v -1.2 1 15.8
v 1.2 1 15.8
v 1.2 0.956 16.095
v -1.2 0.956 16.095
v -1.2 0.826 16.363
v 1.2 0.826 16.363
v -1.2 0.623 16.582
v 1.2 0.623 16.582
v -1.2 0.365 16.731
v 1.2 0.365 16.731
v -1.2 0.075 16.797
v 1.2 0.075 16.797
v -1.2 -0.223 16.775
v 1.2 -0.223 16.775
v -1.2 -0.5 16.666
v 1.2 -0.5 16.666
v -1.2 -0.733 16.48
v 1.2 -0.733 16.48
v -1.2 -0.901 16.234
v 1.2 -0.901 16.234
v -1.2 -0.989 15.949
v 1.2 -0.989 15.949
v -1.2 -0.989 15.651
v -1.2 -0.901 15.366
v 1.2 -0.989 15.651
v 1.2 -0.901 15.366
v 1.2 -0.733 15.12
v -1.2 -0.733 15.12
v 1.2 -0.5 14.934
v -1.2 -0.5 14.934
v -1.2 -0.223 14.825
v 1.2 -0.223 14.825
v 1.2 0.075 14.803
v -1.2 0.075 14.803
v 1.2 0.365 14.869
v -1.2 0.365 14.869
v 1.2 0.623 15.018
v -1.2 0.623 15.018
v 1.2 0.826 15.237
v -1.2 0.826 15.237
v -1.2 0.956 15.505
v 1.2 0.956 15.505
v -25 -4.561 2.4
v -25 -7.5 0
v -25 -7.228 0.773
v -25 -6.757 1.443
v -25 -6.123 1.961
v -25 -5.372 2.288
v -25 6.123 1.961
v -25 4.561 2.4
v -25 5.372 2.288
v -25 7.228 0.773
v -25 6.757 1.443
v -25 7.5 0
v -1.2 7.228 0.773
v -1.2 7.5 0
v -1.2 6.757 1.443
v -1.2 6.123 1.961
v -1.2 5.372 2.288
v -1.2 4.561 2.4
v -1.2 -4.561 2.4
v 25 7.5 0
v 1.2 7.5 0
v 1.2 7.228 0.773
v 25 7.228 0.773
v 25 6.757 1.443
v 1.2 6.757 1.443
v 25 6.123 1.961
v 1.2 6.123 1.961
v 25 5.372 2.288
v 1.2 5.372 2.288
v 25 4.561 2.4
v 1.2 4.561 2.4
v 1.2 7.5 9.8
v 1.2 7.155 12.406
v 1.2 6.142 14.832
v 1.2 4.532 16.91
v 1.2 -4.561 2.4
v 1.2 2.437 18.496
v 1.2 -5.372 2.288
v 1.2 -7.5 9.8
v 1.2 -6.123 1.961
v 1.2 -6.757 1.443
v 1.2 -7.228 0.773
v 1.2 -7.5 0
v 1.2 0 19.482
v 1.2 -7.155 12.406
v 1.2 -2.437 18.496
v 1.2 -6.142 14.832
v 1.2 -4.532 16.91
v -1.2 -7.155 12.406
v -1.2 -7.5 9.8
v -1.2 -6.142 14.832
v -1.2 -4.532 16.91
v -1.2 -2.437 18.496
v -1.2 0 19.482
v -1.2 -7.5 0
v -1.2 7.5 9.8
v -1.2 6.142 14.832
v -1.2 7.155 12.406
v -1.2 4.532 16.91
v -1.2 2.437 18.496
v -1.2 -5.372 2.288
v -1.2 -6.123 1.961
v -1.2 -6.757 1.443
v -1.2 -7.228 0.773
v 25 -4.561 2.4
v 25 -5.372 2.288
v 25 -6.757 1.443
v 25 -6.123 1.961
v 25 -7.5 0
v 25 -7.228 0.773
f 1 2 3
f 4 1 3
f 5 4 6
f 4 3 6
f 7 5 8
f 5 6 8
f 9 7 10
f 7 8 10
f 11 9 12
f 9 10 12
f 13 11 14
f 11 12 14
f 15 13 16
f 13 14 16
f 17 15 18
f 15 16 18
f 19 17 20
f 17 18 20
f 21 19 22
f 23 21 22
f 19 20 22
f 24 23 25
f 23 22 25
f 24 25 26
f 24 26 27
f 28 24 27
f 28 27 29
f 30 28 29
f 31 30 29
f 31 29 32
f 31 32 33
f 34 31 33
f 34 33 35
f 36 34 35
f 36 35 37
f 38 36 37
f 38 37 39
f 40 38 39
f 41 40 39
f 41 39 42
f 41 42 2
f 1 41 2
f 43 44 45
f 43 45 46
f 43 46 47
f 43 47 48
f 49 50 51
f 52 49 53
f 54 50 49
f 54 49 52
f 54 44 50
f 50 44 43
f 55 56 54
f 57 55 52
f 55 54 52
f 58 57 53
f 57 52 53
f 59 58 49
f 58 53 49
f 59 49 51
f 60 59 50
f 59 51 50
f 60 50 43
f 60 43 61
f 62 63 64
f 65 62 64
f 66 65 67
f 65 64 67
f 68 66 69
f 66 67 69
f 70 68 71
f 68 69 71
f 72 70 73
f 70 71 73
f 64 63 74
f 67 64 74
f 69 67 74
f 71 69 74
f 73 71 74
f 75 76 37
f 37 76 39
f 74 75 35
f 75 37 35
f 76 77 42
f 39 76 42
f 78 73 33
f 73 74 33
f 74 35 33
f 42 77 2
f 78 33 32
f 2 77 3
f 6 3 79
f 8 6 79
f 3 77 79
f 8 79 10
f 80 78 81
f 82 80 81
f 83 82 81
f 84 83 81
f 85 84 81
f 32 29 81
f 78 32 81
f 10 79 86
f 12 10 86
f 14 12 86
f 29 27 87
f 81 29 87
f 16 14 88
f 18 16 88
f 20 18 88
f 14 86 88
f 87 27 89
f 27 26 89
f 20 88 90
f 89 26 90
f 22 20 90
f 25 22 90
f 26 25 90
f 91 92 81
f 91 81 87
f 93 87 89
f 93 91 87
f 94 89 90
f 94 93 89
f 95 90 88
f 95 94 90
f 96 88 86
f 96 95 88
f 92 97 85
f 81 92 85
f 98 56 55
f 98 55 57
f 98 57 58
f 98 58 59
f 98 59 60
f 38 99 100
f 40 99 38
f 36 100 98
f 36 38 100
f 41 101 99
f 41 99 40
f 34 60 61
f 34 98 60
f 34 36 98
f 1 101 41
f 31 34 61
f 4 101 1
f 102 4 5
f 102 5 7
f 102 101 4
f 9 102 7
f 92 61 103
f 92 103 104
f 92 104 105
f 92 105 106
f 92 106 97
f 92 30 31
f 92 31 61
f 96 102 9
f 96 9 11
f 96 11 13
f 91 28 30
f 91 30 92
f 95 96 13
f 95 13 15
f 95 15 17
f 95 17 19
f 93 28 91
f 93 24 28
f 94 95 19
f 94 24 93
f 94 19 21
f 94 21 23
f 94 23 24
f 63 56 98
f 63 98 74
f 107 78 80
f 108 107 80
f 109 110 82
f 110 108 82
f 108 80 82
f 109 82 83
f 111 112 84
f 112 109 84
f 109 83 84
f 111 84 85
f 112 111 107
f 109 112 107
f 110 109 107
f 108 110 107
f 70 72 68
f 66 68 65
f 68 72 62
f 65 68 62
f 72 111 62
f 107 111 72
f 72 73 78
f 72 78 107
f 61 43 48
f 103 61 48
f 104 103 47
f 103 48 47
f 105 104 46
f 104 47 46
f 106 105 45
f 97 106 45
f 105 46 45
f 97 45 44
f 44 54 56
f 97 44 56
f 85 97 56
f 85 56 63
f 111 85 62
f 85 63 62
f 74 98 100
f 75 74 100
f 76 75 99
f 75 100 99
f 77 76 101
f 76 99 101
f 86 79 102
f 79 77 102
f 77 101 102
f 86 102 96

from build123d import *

# Parameters (mm, degrees)
F0_W         = 50
F0_H         = 15
F2_DEPTH     = 2.4
F3_W         = 2.4
F3_H         = 15
F4_DEPTH     = 17.4
F6_T1_DEPTH  = 52.4
F5_R         = 1
F7_DEPTH     = 26.201
F8_T1_DEPTH  = 31.1484692284
F8_T3_DEPTH  = 31.1484692284
F8_T8_DEPTH  = 38.4969384567
F8_T13_DEPTH = 38.4969384567
F8_T18_DEPTH = 38.4969384567
F8_T23_DEPTH = 38.4969384567


# Not quite as in the source:
# - a fillet or chamfer that OpenCascade refuses, or shapes differently, is made with other operations: its cross-section is extruded or revolved along the edge and cut away or added


with BuildPart() as f2:
    # F0 (on Top) → F2 (new body)
    with BuildSketch(Plane.XY):
        Rectangle(F0_W, F0_H)
    extrude(amount=F2_DEPTH)

    # F3 (on face) → F4 (join)
    with BuildSketch(Plane.XY.offset(2.4)):
        Rectangle(F3_W, F3_H)
    extrude(amount=F4_DEPTH)

    # F6: fillet of radius 10 on 2 edges, made by hand

    # F6_s2 → F6_t1 (cut)
    with BuildSketch(Plane.YZ.offset(-26.2)):
        with BuildLine():
            ThreePointArc((-7.5, 9.8), (-4.5710678119, 16.8710678119), (2.5, 19.8))
            Line((2.5, 19.8), (-7.5, 19.8))
            Line((-7.5, 19.8), (-7.5, 9.8))
        make_face()
        with BuildLine():
            ThreePointArc((7.5, 9.8), (4.5710678119, 16.8710678119), (-2.5, 19.8))
            Line((-2.5, 19.8), (7.5, 19.8))
            Line((7.5, 19.8), (7.5, 9.8))
        make_face()
    extrude(amount=F6_T1_DEPTH, mode=Mode.SUBTRACT)

    # F5 (on face) → F7 (cut, through all)
    with BuildSketch(Plane.YZ.offset(1.2)):
        with Locations((0, 15.8)):
            Circle(F5_R)
    extrude(amount=-F7_DEPTH, mode=Mode.SUBTRACT)

    # F8: fillet of radius 3 on 4 edges, made by hand

    # F8_s2 → F8_t1 (cut)
    with BuildSketch(Plane.YZ.offset(-32.3484692284)):
        with BuildLine():
            ThreePointArc((-4.5606123087, 2.4), (-6.4579789048, 1.7237900077), (-7.5, 0))
            Line((-7.5, 0), (-7.5, 2.4))
            Line((-7.5, 2.4), (-4.5606123087, 2.4))
        make_face()
        with BuildLine():
            ThreePointArc((7.5, 0), (6.4579789048, 1.7237900077), (4.5606123087, 2.4))
            Line((4.5606123087, 2.4), (7.5, 2.4))
            Line((7.5, 2.4), (7.5, 0))
        make_face()
    extrude(amount=F8_T1_DEPTH, mode=Mode.SUBTRACT)

    # F8_s4 → F8_t3 (cut)
    with BuildSketch(Plane.YZ.offset(1.2)):
        with BuildLine():
            ThreePointArc((-4.5606123087, 2.4), (-6.4579789048, 1.7237900077), (-7.5, 0))
            Line((-7.5, 0), (-7.5, 2.4))
            Line((-7.5, 2.4), (-4.5606123087, 2.4))
        make_face()
        with BuildLine():
            ThreePointArc((7.5, 0), (6.4579789048, 1.7237900077), (4.5606123087, 2.4))
            Line((4.5606123087, 2.4), (7.5, 2.4))
            Line((7.5, 2.4), (7.5, 0))
        make_face()
    extrude(amount=F8_T3_DEPTH, mode=Mode.SUBTRACT)


with BuildPart() as f8_tool6:
    # F8_s7 → F8_t8 (new body)
    with BuildSketch(Plane.YZ.offset(-32.3484692284)):
        with BuildLine():
            ThreePointArc((-4.5606123087, 2.4), (-6.4579789048, 1.7237900077), (-7.5, 0))
            Line((-7.5, 0), (-7.5, 2.4))
            Line((-7.5, 2.4), (-4.5606123087, 2.4))
        make_face()
    extrude(amount=F8_T8_DEPTH)

    split(bisect_by=Plane.YZ.offset(1.2), keep=Keep.TOP)


with BuildPart() as f2_1:
    add(f2.part)

    # F8_t5: cut F8_tool6
    add(f8_tool6.part, mode=Mode.SUBTRACT)


with BuildPart() as f8_tool11:
    # F8_s12 → F8_t13 (new body)
    with BuildSketch(Plane.YZ.offset(-6.1484692284)):
        with BuildLine():
            ThreePointArc((-4.5606123087, 2.4), (-6.4579789048, 1.7237900077), (-7.5, 0))
            Line((-7.5, 0), (-7.5, 2.4))
            Line((-7.5, 2.4), (-4.5606123087, 2.4))
        make_face()
    extrude(amount=F8_T13_DEPTH)

    split(bisect_by=Plane.YZ.offset(-1.2), keep=Keep.BOTTOM)


with BuildPart() as f2_2:
    add(f2_1.part)

    # F8_t10: cut F8_tool11
    add(f8_tool11.part, mode=Mode.SUBTRACT)


with BuildPart() as f8_tool16:
    # F8_s17 → F8_t18 (new body)
    with BuildSketch(Plane.YZ.offset(32.3484692284)):
        with BuildLine():
            ThreePointArc((7.5, 0), (6.4579789048, 1.7237900077), (4.5606123087, 2.4))
            Line((4.5606123087, 2.4), (7.5, 2.4))
            Line((7.5, 2.4), (7.5, 0))
        make_face()
    extrude(amount=-F8_T18_DEPTH)

    split(bisect_by=Plane.YZ.offset(-1.2), keep=Keep.BOTTOM)


with BuildPart() as f2_3:
    add(f2_2.part)

    # F8_t15: cut F8_tool16
    add(f8_tool16.part, mode=Mode.SUBTRACT)


with BuildPart() as f8_tool21:
    # F8_s22 → F8_t23 (new body)
    with BuildSketch(Plane.YZ.offset(6.1484692284)):
        with BuildLine():
            ThreePointArc((7.5, 0), (6.4579789048, 1.7237900077), (4.5606123087, 2.4))
            Line((4.5606123087, 2.4), (7.5, 2.4))
            Line((7.5, 2.4), (7.5, 0))
        make_face()
    extrude(amount=-F8_T23_DEPTH)

    split(bisect_by=Plane.YZ.offset(1.2), keep=Keep.TOP)


with BuildPart() as f2_4:
    add(f2_3.part)

    # F8_t20: cut F8_tool21
    add(f8_tool21.part, mode=Mode.SUBTRACT)


solid = f2_4.part
